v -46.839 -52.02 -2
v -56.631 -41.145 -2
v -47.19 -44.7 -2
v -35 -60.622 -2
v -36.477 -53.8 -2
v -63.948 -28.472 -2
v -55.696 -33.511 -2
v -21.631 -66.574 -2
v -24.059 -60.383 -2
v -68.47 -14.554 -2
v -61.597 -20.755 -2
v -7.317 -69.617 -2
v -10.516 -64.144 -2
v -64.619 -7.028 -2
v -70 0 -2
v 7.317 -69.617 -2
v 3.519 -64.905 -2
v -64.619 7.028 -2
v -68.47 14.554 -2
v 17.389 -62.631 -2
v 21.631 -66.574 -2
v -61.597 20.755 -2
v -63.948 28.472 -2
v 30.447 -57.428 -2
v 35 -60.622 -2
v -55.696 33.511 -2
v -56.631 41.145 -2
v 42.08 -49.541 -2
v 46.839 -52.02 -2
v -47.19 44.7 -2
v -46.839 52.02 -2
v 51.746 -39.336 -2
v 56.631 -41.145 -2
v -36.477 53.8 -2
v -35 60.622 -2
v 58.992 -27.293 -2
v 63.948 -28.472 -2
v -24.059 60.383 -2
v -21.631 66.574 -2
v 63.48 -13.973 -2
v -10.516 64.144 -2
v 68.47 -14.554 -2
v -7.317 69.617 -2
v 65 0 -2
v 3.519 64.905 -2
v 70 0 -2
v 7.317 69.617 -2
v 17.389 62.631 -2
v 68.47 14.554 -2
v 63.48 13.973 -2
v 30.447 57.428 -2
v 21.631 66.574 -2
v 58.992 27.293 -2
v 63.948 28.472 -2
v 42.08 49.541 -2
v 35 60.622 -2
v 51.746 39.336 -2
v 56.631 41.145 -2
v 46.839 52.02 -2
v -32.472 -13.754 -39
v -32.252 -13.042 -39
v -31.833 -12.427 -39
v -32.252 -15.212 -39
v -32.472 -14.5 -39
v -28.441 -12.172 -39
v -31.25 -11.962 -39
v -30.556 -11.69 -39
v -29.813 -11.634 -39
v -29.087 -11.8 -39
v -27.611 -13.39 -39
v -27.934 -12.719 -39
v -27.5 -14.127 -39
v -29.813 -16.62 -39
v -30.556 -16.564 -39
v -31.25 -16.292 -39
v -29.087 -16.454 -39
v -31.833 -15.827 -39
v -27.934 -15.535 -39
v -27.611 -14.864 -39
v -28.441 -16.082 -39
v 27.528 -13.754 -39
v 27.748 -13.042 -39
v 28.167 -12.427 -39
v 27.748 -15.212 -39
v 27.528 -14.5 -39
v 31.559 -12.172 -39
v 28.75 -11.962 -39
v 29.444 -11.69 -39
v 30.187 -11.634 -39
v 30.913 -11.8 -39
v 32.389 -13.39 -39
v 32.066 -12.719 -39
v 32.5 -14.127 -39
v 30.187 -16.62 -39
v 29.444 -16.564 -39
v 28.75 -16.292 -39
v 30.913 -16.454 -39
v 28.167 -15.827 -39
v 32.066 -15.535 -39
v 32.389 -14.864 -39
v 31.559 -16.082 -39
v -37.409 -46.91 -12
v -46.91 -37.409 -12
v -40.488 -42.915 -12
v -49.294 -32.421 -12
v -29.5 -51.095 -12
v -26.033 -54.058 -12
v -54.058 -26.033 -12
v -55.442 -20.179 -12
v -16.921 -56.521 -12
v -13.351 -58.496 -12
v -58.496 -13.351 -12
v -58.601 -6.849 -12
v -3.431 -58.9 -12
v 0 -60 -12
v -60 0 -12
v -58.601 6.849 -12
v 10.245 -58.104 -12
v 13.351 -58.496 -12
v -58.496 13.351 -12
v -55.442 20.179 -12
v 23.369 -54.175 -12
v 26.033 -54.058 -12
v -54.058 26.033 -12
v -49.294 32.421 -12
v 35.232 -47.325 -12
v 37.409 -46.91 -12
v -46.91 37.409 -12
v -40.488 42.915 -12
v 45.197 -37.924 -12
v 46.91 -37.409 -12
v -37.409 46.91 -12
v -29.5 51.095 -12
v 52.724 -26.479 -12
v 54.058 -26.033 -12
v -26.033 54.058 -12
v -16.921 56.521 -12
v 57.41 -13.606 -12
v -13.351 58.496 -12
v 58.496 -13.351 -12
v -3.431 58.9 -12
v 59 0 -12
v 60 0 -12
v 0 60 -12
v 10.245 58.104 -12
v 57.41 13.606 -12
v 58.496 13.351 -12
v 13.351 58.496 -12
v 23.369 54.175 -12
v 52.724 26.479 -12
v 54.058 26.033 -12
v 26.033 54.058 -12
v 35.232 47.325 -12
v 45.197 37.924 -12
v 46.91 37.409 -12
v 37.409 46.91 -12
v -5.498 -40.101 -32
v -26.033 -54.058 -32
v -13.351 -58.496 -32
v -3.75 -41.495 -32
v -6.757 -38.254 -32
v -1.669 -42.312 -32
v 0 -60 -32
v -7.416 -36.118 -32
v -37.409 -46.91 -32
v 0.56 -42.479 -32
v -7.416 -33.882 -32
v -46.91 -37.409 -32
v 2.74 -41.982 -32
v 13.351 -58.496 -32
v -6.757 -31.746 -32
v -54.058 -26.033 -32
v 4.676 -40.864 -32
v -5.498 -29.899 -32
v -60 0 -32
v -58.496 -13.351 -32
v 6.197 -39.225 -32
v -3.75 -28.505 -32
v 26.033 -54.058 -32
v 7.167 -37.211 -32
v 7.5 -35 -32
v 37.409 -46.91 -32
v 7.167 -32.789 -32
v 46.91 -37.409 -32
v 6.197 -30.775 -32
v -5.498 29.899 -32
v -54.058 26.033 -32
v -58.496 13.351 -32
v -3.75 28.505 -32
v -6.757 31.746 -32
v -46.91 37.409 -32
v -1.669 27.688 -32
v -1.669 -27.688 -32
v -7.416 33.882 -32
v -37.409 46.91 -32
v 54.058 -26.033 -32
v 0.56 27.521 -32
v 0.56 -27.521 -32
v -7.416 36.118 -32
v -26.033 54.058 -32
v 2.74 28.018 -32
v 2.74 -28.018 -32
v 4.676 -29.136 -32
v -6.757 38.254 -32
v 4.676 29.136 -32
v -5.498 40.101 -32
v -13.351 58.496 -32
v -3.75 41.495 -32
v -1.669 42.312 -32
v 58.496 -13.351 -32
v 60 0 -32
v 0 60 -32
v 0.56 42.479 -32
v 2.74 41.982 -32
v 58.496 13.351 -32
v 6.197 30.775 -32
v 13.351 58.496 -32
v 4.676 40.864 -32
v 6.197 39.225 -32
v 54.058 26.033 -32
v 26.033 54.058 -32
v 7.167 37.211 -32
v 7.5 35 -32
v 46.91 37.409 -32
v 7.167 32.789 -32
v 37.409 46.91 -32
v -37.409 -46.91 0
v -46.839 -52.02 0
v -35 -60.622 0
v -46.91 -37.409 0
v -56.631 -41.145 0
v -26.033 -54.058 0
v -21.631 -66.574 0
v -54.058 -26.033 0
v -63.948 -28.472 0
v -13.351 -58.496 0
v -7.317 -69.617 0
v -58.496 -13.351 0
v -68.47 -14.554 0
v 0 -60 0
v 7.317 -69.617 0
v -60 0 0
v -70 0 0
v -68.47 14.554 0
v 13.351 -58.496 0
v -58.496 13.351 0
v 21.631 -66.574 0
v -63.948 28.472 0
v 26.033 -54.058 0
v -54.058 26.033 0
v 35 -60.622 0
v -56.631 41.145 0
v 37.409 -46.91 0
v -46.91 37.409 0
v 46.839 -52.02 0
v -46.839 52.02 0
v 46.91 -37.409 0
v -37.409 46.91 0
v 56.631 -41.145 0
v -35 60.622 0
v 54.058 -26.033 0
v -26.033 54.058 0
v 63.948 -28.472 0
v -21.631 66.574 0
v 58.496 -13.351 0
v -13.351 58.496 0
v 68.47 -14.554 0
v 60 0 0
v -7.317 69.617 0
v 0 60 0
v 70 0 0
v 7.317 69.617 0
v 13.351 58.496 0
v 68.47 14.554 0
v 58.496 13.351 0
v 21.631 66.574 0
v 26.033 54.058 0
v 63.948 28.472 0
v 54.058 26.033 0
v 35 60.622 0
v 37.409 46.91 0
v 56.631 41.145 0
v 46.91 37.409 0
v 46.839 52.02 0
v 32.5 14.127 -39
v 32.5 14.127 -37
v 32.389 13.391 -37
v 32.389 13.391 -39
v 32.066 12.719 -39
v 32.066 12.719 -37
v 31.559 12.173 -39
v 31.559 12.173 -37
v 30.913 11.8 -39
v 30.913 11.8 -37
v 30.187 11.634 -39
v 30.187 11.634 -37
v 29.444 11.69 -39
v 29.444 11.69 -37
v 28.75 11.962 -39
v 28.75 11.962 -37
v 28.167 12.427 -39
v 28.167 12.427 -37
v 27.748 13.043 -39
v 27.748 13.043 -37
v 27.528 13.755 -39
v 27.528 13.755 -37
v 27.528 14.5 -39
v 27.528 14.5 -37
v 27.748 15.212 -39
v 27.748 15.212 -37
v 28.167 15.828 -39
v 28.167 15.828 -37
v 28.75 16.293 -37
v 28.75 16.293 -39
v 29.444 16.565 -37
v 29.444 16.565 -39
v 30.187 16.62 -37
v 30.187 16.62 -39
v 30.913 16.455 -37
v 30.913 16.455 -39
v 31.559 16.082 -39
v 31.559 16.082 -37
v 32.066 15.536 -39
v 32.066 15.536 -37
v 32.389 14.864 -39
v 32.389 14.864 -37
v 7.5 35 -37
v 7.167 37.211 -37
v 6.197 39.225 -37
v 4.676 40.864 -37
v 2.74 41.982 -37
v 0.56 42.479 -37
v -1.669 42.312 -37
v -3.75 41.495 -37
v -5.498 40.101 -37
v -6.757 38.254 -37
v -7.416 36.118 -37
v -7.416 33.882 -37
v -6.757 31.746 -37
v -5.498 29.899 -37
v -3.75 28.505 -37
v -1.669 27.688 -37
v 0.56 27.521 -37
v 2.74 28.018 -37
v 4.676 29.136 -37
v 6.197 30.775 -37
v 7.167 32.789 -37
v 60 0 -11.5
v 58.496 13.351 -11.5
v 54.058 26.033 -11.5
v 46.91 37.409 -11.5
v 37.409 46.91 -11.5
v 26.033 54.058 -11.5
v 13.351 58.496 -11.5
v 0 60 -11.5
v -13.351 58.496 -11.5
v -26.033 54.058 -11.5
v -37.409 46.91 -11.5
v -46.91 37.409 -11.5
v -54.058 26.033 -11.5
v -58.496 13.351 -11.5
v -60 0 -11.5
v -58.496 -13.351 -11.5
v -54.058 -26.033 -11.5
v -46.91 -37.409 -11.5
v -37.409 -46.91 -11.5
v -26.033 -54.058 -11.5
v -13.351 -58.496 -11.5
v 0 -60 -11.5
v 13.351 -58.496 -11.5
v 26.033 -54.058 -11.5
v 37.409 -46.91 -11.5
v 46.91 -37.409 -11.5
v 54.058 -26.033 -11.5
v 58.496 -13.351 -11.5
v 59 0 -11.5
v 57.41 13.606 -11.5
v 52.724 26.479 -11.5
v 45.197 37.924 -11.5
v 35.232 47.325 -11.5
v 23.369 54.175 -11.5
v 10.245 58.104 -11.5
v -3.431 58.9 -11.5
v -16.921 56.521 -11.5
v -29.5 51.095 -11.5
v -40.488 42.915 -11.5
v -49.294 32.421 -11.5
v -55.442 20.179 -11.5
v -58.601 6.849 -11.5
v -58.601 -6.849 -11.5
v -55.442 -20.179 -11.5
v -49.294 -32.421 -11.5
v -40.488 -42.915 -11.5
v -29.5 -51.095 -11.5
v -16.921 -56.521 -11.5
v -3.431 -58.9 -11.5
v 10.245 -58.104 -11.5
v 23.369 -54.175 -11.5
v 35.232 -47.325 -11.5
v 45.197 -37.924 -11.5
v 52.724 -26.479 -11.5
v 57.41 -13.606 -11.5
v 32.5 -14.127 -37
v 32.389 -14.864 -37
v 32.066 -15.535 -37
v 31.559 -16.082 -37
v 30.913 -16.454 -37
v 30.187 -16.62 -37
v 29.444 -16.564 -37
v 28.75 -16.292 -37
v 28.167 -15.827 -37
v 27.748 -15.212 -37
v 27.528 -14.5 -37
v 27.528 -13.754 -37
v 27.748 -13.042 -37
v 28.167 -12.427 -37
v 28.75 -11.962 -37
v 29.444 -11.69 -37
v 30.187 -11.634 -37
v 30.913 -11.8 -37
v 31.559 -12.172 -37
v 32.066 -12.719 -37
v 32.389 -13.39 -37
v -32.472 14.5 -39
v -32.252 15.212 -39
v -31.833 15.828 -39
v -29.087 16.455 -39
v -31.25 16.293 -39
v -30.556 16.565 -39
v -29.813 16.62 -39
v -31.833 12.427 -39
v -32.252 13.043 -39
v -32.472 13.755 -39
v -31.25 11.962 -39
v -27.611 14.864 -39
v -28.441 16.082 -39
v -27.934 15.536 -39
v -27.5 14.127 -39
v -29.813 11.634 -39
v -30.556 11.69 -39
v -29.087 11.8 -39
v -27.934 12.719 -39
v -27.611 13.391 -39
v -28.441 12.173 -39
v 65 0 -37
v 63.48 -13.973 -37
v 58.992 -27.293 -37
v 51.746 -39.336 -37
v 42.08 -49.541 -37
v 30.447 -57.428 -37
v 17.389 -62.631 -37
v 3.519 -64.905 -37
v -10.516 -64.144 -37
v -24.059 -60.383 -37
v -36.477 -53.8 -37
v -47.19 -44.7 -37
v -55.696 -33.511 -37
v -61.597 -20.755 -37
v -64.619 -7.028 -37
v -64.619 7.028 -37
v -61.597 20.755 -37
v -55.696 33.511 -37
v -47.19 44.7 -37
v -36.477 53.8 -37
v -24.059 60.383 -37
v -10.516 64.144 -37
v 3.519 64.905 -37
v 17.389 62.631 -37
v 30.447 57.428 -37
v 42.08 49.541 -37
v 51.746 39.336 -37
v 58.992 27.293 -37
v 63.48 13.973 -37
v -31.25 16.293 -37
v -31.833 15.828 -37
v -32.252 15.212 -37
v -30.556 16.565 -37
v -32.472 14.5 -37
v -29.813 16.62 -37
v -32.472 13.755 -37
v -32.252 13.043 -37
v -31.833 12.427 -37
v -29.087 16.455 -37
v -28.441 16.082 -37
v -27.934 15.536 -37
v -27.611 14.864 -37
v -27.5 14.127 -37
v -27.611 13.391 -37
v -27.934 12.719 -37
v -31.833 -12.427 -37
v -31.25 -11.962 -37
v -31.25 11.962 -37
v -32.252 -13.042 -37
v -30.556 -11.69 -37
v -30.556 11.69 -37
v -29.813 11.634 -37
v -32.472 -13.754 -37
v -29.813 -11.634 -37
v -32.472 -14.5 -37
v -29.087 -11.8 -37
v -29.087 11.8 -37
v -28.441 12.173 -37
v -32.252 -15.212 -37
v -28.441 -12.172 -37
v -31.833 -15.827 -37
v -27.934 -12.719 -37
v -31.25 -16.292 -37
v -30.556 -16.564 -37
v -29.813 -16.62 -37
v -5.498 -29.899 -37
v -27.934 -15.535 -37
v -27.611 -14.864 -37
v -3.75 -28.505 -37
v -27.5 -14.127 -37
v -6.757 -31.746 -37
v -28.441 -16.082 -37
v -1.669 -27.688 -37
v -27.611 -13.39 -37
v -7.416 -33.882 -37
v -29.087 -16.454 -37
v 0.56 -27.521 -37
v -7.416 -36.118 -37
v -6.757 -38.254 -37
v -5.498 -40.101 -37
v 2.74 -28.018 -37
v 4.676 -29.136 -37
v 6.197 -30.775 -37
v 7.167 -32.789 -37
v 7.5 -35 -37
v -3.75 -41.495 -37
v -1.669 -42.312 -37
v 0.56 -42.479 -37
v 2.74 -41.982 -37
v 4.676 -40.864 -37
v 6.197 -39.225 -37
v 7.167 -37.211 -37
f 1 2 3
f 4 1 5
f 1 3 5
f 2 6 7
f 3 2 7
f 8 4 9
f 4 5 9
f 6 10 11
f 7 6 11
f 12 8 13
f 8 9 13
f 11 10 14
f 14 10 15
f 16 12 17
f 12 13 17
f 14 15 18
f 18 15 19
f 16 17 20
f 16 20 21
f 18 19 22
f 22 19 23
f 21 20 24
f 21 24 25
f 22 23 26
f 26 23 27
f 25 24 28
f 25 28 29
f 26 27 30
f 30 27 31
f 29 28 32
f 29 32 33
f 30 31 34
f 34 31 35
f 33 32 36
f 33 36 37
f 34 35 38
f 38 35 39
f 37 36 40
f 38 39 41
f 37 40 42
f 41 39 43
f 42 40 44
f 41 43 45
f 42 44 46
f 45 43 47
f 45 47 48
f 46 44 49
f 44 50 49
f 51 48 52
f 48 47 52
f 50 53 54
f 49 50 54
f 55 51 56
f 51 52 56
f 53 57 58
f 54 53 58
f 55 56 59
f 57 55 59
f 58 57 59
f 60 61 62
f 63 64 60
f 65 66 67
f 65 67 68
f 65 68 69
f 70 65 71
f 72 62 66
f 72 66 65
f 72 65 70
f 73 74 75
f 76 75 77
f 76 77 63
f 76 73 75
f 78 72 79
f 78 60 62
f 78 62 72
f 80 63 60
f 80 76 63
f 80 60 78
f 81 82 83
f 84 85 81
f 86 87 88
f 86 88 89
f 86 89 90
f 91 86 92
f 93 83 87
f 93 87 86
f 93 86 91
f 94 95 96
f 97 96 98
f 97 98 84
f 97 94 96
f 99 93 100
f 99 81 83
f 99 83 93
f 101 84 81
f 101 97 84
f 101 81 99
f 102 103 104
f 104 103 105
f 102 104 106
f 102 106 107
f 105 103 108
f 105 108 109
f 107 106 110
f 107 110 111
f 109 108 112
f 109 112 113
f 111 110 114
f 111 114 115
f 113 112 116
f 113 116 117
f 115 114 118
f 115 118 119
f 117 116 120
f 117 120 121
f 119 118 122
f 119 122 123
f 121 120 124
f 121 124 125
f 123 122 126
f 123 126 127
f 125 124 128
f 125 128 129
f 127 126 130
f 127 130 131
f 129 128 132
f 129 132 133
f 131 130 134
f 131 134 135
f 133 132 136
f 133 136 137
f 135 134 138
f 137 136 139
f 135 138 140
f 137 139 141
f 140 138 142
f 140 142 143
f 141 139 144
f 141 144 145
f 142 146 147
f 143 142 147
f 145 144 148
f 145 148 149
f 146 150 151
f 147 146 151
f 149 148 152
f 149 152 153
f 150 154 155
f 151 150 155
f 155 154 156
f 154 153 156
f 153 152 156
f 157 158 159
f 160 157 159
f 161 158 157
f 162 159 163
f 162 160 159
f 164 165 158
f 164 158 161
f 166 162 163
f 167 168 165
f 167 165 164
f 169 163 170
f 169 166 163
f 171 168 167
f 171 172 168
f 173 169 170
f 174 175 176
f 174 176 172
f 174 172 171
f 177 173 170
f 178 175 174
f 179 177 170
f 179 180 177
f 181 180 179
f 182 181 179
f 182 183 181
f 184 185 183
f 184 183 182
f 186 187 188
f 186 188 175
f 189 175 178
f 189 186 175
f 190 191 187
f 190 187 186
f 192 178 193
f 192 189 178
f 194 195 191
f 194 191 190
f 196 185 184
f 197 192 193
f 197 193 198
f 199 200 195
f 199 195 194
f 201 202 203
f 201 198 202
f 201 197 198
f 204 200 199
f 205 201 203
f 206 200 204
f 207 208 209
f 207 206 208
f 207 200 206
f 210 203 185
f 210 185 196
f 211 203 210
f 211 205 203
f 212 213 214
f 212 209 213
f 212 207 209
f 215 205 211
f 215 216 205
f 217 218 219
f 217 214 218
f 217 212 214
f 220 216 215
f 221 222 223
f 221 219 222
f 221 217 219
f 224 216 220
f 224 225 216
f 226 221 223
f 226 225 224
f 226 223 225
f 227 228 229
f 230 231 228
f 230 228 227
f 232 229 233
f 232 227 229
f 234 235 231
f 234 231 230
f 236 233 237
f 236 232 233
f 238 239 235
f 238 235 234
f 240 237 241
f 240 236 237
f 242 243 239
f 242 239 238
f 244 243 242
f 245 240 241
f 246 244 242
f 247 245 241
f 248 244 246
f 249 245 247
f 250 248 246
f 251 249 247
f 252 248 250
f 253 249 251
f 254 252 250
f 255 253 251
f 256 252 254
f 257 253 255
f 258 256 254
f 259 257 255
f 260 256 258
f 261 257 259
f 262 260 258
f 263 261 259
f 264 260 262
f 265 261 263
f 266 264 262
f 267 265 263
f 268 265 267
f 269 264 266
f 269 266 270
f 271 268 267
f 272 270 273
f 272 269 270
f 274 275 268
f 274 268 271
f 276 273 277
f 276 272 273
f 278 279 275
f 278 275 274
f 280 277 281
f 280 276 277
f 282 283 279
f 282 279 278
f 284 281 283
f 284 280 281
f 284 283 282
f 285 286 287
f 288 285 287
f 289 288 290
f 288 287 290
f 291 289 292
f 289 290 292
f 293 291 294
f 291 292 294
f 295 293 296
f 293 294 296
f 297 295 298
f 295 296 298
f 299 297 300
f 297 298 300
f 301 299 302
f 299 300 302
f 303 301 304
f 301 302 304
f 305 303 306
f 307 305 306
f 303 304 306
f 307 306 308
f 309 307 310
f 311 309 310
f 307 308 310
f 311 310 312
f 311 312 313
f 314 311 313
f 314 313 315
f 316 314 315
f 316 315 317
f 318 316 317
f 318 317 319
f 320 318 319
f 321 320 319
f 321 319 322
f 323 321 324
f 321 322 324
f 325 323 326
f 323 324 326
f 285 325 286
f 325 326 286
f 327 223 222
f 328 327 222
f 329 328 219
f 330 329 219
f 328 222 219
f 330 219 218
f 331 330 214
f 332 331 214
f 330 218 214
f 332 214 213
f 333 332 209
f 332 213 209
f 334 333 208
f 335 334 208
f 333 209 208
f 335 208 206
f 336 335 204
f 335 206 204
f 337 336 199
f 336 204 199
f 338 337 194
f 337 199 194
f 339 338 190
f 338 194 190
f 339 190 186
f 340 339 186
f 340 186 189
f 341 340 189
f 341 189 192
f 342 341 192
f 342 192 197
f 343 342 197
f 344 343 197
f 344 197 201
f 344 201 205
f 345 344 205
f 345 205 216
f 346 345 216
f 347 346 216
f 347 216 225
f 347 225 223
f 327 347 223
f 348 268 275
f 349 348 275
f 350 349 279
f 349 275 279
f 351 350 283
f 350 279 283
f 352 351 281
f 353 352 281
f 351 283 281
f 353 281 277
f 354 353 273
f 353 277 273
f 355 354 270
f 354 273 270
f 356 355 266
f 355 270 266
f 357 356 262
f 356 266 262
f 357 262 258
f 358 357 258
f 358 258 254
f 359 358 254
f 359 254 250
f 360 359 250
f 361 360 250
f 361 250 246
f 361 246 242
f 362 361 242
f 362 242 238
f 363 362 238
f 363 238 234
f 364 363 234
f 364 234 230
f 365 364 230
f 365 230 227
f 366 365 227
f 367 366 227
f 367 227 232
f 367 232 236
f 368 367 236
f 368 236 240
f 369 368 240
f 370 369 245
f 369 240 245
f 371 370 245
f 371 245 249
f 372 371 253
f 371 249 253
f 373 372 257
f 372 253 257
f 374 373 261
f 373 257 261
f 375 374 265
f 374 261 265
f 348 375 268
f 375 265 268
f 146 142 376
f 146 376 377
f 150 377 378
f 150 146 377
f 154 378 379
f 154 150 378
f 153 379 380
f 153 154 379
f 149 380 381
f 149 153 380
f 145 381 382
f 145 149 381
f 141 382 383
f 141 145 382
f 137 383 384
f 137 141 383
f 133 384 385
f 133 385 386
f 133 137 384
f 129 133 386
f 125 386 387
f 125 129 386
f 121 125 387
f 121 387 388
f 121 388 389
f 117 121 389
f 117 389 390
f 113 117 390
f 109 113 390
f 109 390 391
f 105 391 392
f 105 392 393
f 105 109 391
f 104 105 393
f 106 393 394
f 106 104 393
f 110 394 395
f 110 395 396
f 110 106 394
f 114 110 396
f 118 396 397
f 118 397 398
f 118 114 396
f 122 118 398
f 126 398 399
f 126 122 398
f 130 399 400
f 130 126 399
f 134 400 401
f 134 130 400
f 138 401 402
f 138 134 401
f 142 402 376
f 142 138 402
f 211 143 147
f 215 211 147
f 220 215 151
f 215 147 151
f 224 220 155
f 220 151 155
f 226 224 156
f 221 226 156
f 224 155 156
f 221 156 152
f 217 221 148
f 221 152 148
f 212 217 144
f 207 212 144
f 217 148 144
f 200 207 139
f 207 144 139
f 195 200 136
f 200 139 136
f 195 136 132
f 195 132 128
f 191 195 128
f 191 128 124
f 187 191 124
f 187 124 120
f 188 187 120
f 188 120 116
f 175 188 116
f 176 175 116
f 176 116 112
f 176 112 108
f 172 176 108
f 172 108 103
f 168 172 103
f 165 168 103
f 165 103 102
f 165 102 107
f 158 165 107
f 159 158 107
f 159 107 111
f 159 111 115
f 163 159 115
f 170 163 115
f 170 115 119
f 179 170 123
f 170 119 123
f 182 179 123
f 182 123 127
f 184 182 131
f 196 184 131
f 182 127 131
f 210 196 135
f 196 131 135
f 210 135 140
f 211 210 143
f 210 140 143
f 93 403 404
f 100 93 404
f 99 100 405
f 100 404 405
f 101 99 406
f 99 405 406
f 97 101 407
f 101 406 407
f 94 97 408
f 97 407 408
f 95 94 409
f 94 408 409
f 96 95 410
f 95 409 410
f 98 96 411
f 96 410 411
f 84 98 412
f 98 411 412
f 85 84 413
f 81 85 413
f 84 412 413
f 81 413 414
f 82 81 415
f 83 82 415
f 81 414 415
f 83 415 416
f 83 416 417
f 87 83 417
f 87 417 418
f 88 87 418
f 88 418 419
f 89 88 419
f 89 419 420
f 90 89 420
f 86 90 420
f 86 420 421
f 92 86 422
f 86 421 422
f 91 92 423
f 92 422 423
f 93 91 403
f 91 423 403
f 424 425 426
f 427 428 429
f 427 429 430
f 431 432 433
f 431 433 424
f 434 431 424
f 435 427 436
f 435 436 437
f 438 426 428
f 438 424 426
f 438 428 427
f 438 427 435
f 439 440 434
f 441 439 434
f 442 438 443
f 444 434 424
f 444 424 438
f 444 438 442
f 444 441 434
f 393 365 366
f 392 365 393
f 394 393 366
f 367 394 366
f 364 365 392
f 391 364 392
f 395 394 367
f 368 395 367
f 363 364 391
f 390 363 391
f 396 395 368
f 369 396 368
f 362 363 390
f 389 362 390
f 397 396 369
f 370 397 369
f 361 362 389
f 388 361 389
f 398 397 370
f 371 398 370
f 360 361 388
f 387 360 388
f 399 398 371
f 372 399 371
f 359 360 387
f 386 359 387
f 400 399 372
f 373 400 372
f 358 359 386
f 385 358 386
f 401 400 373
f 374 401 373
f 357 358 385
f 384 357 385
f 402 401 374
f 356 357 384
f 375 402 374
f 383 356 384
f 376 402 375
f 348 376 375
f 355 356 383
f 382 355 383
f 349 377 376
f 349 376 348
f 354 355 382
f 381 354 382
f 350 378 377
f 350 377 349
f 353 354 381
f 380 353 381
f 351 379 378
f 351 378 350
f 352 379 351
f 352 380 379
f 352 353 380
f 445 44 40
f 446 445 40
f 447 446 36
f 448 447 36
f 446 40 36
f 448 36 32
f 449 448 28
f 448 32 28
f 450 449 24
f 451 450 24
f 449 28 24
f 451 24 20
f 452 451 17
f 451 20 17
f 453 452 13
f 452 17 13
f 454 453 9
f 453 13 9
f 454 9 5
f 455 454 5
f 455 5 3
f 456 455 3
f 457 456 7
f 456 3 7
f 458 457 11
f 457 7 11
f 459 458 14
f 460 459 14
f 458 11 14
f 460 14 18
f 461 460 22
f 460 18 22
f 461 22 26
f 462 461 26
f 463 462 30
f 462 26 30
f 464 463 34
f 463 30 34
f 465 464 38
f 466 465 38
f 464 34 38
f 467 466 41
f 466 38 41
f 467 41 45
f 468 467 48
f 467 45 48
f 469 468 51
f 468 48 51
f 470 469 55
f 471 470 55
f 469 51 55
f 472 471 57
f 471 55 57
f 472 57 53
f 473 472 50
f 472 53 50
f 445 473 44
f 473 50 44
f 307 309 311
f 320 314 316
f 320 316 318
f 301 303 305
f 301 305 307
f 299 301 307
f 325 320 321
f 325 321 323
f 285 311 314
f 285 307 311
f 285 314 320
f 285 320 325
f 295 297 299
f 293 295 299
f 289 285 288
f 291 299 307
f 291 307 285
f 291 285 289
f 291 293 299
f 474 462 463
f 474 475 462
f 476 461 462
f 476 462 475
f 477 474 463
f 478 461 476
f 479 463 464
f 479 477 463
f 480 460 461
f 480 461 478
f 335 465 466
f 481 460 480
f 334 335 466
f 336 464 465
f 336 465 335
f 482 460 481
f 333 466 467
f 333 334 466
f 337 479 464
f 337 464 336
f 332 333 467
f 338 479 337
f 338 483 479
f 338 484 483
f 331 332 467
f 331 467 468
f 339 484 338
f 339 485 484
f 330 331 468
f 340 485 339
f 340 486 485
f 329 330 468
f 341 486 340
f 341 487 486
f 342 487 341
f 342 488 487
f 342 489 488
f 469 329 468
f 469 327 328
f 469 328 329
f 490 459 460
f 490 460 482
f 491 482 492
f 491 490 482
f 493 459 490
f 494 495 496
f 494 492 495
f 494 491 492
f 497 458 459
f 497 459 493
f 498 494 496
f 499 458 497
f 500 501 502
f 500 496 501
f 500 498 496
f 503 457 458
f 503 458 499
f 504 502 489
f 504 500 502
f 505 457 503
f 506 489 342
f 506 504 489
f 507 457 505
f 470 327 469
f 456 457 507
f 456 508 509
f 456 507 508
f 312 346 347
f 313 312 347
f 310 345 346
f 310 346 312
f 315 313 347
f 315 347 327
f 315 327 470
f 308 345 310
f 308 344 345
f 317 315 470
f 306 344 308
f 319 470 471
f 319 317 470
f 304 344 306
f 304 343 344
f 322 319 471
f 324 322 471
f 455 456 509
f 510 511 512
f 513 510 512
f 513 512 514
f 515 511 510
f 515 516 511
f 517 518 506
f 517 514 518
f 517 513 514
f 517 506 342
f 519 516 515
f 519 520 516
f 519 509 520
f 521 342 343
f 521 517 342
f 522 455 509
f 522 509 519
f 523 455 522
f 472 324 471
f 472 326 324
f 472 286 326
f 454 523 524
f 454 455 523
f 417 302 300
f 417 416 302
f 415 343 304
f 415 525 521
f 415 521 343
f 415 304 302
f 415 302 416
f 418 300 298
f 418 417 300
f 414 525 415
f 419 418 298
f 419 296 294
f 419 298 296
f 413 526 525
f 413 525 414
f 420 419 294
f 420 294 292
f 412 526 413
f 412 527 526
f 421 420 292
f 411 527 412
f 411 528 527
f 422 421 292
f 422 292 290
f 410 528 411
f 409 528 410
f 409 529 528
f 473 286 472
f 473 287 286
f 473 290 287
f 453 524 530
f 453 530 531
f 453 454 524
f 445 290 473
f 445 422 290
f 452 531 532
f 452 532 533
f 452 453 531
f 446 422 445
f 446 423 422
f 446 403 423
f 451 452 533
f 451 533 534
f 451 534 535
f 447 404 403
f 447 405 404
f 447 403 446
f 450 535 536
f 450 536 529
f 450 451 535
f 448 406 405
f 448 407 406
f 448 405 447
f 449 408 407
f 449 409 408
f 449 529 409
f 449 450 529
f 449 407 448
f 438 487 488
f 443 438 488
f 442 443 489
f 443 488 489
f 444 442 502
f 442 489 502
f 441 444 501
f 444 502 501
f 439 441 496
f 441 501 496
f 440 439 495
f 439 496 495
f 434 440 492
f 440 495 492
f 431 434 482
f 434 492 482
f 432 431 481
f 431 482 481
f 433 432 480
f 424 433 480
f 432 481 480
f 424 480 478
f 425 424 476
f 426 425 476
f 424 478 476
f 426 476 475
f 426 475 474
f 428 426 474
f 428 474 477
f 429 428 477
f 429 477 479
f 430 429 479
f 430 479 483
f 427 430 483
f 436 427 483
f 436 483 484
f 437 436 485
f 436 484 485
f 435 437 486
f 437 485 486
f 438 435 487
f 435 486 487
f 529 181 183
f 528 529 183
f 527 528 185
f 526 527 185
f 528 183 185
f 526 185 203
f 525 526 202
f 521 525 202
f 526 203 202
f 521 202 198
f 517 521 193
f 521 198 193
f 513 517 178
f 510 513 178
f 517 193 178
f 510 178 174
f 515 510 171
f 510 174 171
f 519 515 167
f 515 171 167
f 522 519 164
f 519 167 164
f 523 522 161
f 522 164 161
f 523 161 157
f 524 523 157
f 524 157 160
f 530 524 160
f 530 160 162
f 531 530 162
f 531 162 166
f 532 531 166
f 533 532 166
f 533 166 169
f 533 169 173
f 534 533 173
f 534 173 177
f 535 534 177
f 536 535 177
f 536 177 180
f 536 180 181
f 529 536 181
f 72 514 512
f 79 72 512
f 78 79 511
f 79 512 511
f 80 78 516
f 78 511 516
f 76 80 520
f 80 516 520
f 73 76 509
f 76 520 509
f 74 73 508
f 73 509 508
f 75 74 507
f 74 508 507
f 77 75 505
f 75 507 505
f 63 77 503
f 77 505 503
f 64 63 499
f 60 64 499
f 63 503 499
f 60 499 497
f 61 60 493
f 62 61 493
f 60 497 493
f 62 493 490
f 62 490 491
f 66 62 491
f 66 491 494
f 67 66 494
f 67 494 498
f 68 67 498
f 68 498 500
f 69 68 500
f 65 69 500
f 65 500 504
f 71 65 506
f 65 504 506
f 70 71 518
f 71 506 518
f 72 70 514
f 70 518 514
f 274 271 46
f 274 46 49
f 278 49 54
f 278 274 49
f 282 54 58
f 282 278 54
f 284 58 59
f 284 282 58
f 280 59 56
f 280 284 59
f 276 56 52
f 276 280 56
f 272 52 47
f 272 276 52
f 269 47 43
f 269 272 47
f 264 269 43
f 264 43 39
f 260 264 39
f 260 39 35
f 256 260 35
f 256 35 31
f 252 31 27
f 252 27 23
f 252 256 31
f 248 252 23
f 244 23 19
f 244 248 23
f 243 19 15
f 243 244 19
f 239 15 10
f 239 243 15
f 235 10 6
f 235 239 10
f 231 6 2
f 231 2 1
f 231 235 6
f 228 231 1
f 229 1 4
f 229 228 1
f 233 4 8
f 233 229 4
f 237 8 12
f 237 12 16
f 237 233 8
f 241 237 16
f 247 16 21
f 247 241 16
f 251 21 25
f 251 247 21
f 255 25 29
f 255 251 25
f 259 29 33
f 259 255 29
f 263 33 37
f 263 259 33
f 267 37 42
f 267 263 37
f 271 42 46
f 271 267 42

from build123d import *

# Parameters (mm, degrees)
F0_R      = 70
F1_DEPTH  = 2
F2_R      = 65
F3_DEPTH  = 35
F4_R      = 60
F5_DEPTH  = 32
F6_R      = 7.5
F7_DEPTH  = 5.001
F8_R      = 2.5
F9_DEPTH  = 2
F11_R     = 62.2
F11_R_2   = 59
F12_DEPTH = 0.5


with BuildPart() as f1:
    # F0 (on Top) → F1 (new body)
    with BuildSketch(Plane.XY):
        Circle(F0_R)
    extrude(amount=-F1_DEPTH)

    # F2 (on face) → F3 (join)
    with BuildSketch(Plane(origin=(0, 0, -2), x_dir=(1, 0, 0), z_dir=(0, 0, -1))):
        Circle(F2_R)
    extrude(amount=F3_DEPTH)

    # F4 (on face) → F5 (cut)
    with BuildSketch(Plane.XY):
        Circle(F4_R)
    extrude(amount=-F5_DEPTH, mode=Mode.SUBTRACT)

    # F6 (on face) → F7 (cut, through all)
    with BuildSketch(Plane.XY.offset(-32)):
        with Locations((0, -35)):
            Circle(F6_R)
        with Locations((0, 35)):
            Circle(F6_R)
    extrude(amount=-F7_DEPTH, mode=Mode.SUBTRACT)

    # F8 (on face) → F9 (join)
    with BuildSketch(Plane(origin=(0, 0, -37), x_dir=(1, 0, 0), z_dir=(0, 0, -1))):
        with Locations((-30, 14.127)):
            Circle(F8_R)
        with Locations((-30, -14.12747)):
            Circle(F8_R)
        with Locations((30, 14.127)):
            Circle(F8_R)
        with Locations((30, -14.12747)):
            Circle(F8_R)
    extrude(amount=F9_DEPTH)

    # F11 (on offset) → F12 (join)
    with BuildSketch(Plane.XY.offset(-12)):
        Circle(F11_R)
        Circle(F11_R_2, mode=Mode.SUBTRACT)
    extrude(amount=F12_DEPTH)


solid = f1.part
